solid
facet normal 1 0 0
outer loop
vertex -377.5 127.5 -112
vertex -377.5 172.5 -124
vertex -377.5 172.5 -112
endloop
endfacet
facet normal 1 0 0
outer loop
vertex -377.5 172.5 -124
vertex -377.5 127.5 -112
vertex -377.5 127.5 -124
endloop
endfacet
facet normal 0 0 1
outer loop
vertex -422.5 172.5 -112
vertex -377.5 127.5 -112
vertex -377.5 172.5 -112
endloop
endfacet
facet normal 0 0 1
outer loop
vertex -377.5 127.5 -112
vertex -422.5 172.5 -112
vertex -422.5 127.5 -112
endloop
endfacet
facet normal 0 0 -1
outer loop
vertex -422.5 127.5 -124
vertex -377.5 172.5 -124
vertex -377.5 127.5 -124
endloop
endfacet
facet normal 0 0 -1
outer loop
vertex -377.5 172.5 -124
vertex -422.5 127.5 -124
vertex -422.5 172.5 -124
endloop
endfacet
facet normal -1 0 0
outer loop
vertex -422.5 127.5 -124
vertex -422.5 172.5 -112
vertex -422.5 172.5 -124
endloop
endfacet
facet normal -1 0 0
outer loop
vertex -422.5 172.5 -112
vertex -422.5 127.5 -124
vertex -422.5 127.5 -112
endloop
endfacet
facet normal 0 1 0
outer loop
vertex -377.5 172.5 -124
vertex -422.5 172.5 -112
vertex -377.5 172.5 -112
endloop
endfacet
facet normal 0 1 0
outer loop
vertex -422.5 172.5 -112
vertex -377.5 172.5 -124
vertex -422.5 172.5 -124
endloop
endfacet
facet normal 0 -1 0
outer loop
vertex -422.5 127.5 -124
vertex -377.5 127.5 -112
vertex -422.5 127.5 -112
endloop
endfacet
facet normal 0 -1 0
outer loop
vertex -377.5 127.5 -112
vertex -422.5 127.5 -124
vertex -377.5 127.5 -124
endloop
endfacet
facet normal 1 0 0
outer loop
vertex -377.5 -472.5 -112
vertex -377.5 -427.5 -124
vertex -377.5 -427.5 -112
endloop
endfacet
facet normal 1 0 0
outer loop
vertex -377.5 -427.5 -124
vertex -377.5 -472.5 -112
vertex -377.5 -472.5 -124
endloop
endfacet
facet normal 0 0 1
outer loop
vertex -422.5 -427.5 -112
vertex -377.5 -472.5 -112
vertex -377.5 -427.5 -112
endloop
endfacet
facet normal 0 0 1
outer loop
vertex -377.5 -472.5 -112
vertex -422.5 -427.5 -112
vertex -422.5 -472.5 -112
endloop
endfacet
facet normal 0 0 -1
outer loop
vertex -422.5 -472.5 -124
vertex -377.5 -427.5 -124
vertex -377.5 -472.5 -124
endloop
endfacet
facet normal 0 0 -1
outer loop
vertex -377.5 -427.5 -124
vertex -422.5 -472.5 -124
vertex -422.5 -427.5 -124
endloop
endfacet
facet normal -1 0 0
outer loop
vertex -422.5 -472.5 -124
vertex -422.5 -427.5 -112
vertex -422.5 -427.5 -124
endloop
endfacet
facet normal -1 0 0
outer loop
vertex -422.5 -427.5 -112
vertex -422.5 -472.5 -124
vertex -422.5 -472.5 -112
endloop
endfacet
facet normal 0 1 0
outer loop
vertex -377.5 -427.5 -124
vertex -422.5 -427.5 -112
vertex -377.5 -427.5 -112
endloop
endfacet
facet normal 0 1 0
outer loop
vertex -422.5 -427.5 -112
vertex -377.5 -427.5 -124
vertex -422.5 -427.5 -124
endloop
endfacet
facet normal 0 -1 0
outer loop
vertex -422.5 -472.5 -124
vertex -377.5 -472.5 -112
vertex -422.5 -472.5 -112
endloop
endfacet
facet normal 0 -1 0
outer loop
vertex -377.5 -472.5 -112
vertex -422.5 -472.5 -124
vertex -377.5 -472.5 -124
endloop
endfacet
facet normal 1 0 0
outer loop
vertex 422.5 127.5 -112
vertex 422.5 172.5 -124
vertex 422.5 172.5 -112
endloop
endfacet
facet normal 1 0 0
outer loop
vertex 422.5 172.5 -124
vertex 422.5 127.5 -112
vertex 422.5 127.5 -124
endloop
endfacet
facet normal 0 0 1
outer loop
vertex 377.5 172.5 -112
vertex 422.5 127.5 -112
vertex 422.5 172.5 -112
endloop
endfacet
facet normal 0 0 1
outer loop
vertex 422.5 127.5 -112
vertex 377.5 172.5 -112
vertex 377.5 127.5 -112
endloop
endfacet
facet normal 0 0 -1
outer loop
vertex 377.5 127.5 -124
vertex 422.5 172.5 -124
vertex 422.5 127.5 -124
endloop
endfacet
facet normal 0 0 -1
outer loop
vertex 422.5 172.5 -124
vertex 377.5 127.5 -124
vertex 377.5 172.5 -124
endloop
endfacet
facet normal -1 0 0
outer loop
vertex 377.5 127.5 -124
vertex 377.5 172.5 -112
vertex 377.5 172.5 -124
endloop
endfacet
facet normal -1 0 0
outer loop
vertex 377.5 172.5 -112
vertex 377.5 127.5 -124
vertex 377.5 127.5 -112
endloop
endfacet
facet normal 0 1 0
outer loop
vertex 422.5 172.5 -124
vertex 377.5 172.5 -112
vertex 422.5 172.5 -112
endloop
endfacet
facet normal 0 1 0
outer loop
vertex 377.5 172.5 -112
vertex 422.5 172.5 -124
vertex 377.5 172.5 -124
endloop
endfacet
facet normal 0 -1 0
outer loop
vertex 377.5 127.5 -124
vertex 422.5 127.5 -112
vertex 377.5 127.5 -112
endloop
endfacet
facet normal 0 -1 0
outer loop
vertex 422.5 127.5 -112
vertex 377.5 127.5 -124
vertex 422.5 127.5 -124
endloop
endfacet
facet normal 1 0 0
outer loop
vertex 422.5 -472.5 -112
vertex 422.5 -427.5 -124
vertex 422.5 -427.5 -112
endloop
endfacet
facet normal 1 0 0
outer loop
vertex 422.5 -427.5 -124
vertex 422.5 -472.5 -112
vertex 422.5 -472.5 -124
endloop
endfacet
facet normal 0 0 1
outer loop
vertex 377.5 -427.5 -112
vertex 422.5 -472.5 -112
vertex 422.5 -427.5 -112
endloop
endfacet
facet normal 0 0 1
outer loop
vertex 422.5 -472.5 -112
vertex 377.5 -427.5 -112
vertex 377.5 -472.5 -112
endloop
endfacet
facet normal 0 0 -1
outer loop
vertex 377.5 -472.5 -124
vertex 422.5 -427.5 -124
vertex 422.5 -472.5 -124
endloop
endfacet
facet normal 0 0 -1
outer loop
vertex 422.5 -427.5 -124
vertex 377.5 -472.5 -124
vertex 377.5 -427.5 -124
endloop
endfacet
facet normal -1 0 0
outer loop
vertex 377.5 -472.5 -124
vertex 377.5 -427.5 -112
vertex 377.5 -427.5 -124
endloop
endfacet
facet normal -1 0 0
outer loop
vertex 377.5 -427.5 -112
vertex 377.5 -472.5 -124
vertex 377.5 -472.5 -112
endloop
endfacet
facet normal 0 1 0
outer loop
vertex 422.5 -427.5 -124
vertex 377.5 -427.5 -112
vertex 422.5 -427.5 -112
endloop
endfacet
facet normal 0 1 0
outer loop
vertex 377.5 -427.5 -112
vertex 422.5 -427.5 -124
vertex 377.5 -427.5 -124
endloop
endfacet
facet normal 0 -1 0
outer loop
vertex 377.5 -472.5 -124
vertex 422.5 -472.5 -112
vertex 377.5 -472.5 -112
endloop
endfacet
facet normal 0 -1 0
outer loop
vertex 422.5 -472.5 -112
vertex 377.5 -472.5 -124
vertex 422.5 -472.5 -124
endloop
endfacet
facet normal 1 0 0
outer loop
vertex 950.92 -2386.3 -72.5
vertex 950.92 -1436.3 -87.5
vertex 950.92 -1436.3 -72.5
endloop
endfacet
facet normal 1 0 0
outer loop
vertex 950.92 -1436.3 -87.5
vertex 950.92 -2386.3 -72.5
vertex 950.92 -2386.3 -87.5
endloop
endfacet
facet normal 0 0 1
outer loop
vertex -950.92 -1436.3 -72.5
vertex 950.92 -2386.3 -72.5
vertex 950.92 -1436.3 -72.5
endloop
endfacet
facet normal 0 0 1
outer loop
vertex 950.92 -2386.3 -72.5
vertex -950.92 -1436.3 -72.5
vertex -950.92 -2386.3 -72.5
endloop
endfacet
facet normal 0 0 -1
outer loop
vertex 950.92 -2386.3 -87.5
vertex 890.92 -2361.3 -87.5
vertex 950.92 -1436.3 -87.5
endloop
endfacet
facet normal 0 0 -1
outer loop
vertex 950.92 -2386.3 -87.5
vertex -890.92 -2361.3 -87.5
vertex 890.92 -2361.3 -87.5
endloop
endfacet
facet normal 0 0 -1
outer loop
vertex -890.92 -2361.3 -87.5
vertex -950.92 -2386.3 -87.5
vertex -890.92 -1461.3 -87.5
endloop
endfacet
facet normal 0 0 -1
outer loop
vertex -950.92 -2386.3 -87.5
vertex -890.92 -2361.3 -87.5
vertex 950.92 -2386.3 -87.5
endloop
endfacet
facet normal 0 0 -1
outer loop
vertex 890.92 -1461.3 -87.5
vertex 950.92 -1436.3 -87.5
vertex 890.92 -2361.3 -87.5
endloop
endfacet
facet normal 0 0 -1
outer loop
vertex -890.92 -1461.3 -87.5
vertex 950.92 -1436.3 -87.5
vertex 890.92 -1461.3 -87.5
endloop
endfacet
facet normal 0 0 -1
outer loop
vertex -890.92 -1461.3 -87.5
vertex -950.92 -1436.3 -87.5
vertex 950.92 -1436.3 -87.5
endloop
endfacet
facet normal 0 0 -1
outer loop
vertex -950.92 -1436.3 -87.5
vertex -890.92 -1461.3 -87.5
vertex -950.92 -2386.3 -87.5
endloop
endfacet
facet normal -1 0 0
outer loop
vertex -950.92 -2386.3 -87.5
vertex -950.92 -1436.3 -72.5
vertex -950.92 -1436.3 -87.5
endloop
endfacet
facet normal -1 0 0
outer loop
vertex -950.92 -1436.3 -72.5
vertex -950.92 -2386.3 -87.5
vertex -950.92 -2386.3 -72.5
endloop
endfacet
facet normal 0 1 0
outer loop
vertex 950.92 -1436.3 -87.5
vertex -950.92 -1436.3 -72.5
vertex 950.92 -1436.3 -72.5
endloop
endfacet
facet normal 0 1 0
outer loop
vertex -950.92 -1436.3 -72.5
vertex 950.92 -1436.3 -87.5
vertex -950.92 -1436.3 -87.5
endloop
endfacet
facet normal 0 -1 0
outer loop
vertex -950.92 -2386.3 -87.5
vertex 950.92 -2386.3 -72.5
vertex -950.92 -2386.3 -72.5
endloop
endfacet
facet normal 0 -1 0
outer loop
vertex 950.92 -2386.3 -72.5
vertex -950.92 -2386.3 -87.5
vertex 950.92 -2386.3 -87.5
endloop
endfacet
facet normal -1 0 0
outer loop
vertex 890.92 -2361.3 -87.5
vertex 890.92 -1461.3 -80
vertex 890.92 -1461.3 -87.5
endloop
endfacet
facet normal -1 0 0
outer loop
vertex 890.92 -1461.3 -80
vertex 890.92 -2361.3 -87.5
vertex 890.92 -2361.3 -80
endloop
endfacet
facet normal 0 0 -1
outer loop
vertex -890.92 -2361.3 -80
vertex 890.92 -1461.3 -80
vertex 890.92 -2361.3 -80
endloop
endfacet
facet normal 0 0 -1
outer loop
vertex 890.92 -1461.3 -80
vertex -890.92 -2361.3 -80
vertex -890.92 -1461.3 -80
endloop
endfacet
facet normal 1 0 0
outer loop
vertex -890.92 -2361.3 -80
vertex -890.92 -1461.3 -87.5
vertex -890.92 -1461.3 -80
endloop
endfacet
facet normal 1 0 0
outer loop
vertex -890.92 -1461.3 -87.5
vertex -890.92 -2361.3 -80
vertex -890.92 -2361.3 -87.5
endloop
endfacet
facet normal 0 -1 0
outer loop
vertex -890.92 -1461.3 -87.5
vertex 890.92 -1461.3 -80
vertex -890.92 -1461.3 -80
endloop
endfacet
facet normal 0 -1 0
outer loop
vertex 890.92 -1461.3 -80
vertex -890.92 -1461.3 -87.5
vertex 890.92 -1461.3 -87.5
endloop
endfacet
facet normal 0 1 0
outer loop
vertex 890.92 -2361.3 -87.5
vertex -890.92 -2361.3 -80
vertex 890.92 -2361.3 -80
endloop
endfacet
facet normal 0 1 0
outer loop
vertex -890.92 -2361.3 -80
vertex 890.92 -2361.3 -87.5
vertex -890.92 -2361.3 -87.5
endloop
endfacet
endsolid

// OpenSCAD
// ====================================================================================
// REVOLUTIONARY TECHNOLOGY COMPANY & UNIVERSITY OF WASHINGTON DEPARTMENT OF PHYSICS
// Subsystem: impala_ss_load_zones.scad (Sedan Occupant & Luggage Force Anchor Pockets)
// Core Application: Multi-Zone Structural Weight Tracking for Active Suspension Balance
// Center Origin (0,0,0) = Geometric Centerpoint of the 119-Inch Wheelbase Centerline
// ====================================================================================

$fn = 100; // High-precision CNC milling and sensor pocket depth resolution

// --- 1967/2027 Impala SS Cabin Grid Constants (mm) ---
inch_to_mm         = 25.4;
impala_wheelbase   = 119.0 * inch_to_mm; // Exactly 3022.60 mm classic tracking length [INDEX]
body_total_width   = 79.6 * inch_to_mm;  // 2021.84 mm wide muscle-car stance [INDEX]
load_cell_pocket_d = 45.00;              // Square pocket housing heavy-tonnage load cell buttons

module passenger_seat_load_pockets() {
    echo("COMPILING ARMORED FLOOR PAN SEAT TRACK LOAD SENSOR APERTURES");
    // Generates 4x isolated structural weight sensor pockets underneath front and rear seat rails
    color("DimGrey") {
        for (side = [-1, 1]) {
            // Front Seat Row Coordinates Mapped over Titanium Rails [INDEX]
            translate([side * 400, 150, -118])
                cube([load_cell_pocket_d, load_cell_pocket_d, 12], center=true);
            
            // Rear Passenger Row Coordinates Mapped over 2016 Fabric Cutters [INDEX]
            translate([side * 400, -450, -118])
                cube([load_cell_pocket_d, load_cell_pocket_d, 12], center=true);
        }
    }
}

module trunk_luggage_weight_pan() {
    echo("COMPILING RECESSED REAR CARGO PROFILE LUGGAGE SENSOR DECK");
    // Deep luggage compartment force tracking pan positioned behind the rear axle centerline
    color("DarkSlateGrey") {
        translate([0, -impala_wheelbase/2 - 400, -80]) {
            difference() {
                // Main structural luggage weight platform deck plate
                cube([body_total_width - 120, 950, 15.0], center=true);
                // Weight optimization grooves clearing the 5° sloped check-valve scuppers [INDEX]
                translate([0, 0, -5])
                    cube([body_total_width - 240, 900, 10.0], center=true);
            }
        }
    }
}

// --- Composite Load Zone Platform Instantiation ---
union() {
    passenger_seat_load_pockets();
    trunk_luggage_weight_pan();
}
